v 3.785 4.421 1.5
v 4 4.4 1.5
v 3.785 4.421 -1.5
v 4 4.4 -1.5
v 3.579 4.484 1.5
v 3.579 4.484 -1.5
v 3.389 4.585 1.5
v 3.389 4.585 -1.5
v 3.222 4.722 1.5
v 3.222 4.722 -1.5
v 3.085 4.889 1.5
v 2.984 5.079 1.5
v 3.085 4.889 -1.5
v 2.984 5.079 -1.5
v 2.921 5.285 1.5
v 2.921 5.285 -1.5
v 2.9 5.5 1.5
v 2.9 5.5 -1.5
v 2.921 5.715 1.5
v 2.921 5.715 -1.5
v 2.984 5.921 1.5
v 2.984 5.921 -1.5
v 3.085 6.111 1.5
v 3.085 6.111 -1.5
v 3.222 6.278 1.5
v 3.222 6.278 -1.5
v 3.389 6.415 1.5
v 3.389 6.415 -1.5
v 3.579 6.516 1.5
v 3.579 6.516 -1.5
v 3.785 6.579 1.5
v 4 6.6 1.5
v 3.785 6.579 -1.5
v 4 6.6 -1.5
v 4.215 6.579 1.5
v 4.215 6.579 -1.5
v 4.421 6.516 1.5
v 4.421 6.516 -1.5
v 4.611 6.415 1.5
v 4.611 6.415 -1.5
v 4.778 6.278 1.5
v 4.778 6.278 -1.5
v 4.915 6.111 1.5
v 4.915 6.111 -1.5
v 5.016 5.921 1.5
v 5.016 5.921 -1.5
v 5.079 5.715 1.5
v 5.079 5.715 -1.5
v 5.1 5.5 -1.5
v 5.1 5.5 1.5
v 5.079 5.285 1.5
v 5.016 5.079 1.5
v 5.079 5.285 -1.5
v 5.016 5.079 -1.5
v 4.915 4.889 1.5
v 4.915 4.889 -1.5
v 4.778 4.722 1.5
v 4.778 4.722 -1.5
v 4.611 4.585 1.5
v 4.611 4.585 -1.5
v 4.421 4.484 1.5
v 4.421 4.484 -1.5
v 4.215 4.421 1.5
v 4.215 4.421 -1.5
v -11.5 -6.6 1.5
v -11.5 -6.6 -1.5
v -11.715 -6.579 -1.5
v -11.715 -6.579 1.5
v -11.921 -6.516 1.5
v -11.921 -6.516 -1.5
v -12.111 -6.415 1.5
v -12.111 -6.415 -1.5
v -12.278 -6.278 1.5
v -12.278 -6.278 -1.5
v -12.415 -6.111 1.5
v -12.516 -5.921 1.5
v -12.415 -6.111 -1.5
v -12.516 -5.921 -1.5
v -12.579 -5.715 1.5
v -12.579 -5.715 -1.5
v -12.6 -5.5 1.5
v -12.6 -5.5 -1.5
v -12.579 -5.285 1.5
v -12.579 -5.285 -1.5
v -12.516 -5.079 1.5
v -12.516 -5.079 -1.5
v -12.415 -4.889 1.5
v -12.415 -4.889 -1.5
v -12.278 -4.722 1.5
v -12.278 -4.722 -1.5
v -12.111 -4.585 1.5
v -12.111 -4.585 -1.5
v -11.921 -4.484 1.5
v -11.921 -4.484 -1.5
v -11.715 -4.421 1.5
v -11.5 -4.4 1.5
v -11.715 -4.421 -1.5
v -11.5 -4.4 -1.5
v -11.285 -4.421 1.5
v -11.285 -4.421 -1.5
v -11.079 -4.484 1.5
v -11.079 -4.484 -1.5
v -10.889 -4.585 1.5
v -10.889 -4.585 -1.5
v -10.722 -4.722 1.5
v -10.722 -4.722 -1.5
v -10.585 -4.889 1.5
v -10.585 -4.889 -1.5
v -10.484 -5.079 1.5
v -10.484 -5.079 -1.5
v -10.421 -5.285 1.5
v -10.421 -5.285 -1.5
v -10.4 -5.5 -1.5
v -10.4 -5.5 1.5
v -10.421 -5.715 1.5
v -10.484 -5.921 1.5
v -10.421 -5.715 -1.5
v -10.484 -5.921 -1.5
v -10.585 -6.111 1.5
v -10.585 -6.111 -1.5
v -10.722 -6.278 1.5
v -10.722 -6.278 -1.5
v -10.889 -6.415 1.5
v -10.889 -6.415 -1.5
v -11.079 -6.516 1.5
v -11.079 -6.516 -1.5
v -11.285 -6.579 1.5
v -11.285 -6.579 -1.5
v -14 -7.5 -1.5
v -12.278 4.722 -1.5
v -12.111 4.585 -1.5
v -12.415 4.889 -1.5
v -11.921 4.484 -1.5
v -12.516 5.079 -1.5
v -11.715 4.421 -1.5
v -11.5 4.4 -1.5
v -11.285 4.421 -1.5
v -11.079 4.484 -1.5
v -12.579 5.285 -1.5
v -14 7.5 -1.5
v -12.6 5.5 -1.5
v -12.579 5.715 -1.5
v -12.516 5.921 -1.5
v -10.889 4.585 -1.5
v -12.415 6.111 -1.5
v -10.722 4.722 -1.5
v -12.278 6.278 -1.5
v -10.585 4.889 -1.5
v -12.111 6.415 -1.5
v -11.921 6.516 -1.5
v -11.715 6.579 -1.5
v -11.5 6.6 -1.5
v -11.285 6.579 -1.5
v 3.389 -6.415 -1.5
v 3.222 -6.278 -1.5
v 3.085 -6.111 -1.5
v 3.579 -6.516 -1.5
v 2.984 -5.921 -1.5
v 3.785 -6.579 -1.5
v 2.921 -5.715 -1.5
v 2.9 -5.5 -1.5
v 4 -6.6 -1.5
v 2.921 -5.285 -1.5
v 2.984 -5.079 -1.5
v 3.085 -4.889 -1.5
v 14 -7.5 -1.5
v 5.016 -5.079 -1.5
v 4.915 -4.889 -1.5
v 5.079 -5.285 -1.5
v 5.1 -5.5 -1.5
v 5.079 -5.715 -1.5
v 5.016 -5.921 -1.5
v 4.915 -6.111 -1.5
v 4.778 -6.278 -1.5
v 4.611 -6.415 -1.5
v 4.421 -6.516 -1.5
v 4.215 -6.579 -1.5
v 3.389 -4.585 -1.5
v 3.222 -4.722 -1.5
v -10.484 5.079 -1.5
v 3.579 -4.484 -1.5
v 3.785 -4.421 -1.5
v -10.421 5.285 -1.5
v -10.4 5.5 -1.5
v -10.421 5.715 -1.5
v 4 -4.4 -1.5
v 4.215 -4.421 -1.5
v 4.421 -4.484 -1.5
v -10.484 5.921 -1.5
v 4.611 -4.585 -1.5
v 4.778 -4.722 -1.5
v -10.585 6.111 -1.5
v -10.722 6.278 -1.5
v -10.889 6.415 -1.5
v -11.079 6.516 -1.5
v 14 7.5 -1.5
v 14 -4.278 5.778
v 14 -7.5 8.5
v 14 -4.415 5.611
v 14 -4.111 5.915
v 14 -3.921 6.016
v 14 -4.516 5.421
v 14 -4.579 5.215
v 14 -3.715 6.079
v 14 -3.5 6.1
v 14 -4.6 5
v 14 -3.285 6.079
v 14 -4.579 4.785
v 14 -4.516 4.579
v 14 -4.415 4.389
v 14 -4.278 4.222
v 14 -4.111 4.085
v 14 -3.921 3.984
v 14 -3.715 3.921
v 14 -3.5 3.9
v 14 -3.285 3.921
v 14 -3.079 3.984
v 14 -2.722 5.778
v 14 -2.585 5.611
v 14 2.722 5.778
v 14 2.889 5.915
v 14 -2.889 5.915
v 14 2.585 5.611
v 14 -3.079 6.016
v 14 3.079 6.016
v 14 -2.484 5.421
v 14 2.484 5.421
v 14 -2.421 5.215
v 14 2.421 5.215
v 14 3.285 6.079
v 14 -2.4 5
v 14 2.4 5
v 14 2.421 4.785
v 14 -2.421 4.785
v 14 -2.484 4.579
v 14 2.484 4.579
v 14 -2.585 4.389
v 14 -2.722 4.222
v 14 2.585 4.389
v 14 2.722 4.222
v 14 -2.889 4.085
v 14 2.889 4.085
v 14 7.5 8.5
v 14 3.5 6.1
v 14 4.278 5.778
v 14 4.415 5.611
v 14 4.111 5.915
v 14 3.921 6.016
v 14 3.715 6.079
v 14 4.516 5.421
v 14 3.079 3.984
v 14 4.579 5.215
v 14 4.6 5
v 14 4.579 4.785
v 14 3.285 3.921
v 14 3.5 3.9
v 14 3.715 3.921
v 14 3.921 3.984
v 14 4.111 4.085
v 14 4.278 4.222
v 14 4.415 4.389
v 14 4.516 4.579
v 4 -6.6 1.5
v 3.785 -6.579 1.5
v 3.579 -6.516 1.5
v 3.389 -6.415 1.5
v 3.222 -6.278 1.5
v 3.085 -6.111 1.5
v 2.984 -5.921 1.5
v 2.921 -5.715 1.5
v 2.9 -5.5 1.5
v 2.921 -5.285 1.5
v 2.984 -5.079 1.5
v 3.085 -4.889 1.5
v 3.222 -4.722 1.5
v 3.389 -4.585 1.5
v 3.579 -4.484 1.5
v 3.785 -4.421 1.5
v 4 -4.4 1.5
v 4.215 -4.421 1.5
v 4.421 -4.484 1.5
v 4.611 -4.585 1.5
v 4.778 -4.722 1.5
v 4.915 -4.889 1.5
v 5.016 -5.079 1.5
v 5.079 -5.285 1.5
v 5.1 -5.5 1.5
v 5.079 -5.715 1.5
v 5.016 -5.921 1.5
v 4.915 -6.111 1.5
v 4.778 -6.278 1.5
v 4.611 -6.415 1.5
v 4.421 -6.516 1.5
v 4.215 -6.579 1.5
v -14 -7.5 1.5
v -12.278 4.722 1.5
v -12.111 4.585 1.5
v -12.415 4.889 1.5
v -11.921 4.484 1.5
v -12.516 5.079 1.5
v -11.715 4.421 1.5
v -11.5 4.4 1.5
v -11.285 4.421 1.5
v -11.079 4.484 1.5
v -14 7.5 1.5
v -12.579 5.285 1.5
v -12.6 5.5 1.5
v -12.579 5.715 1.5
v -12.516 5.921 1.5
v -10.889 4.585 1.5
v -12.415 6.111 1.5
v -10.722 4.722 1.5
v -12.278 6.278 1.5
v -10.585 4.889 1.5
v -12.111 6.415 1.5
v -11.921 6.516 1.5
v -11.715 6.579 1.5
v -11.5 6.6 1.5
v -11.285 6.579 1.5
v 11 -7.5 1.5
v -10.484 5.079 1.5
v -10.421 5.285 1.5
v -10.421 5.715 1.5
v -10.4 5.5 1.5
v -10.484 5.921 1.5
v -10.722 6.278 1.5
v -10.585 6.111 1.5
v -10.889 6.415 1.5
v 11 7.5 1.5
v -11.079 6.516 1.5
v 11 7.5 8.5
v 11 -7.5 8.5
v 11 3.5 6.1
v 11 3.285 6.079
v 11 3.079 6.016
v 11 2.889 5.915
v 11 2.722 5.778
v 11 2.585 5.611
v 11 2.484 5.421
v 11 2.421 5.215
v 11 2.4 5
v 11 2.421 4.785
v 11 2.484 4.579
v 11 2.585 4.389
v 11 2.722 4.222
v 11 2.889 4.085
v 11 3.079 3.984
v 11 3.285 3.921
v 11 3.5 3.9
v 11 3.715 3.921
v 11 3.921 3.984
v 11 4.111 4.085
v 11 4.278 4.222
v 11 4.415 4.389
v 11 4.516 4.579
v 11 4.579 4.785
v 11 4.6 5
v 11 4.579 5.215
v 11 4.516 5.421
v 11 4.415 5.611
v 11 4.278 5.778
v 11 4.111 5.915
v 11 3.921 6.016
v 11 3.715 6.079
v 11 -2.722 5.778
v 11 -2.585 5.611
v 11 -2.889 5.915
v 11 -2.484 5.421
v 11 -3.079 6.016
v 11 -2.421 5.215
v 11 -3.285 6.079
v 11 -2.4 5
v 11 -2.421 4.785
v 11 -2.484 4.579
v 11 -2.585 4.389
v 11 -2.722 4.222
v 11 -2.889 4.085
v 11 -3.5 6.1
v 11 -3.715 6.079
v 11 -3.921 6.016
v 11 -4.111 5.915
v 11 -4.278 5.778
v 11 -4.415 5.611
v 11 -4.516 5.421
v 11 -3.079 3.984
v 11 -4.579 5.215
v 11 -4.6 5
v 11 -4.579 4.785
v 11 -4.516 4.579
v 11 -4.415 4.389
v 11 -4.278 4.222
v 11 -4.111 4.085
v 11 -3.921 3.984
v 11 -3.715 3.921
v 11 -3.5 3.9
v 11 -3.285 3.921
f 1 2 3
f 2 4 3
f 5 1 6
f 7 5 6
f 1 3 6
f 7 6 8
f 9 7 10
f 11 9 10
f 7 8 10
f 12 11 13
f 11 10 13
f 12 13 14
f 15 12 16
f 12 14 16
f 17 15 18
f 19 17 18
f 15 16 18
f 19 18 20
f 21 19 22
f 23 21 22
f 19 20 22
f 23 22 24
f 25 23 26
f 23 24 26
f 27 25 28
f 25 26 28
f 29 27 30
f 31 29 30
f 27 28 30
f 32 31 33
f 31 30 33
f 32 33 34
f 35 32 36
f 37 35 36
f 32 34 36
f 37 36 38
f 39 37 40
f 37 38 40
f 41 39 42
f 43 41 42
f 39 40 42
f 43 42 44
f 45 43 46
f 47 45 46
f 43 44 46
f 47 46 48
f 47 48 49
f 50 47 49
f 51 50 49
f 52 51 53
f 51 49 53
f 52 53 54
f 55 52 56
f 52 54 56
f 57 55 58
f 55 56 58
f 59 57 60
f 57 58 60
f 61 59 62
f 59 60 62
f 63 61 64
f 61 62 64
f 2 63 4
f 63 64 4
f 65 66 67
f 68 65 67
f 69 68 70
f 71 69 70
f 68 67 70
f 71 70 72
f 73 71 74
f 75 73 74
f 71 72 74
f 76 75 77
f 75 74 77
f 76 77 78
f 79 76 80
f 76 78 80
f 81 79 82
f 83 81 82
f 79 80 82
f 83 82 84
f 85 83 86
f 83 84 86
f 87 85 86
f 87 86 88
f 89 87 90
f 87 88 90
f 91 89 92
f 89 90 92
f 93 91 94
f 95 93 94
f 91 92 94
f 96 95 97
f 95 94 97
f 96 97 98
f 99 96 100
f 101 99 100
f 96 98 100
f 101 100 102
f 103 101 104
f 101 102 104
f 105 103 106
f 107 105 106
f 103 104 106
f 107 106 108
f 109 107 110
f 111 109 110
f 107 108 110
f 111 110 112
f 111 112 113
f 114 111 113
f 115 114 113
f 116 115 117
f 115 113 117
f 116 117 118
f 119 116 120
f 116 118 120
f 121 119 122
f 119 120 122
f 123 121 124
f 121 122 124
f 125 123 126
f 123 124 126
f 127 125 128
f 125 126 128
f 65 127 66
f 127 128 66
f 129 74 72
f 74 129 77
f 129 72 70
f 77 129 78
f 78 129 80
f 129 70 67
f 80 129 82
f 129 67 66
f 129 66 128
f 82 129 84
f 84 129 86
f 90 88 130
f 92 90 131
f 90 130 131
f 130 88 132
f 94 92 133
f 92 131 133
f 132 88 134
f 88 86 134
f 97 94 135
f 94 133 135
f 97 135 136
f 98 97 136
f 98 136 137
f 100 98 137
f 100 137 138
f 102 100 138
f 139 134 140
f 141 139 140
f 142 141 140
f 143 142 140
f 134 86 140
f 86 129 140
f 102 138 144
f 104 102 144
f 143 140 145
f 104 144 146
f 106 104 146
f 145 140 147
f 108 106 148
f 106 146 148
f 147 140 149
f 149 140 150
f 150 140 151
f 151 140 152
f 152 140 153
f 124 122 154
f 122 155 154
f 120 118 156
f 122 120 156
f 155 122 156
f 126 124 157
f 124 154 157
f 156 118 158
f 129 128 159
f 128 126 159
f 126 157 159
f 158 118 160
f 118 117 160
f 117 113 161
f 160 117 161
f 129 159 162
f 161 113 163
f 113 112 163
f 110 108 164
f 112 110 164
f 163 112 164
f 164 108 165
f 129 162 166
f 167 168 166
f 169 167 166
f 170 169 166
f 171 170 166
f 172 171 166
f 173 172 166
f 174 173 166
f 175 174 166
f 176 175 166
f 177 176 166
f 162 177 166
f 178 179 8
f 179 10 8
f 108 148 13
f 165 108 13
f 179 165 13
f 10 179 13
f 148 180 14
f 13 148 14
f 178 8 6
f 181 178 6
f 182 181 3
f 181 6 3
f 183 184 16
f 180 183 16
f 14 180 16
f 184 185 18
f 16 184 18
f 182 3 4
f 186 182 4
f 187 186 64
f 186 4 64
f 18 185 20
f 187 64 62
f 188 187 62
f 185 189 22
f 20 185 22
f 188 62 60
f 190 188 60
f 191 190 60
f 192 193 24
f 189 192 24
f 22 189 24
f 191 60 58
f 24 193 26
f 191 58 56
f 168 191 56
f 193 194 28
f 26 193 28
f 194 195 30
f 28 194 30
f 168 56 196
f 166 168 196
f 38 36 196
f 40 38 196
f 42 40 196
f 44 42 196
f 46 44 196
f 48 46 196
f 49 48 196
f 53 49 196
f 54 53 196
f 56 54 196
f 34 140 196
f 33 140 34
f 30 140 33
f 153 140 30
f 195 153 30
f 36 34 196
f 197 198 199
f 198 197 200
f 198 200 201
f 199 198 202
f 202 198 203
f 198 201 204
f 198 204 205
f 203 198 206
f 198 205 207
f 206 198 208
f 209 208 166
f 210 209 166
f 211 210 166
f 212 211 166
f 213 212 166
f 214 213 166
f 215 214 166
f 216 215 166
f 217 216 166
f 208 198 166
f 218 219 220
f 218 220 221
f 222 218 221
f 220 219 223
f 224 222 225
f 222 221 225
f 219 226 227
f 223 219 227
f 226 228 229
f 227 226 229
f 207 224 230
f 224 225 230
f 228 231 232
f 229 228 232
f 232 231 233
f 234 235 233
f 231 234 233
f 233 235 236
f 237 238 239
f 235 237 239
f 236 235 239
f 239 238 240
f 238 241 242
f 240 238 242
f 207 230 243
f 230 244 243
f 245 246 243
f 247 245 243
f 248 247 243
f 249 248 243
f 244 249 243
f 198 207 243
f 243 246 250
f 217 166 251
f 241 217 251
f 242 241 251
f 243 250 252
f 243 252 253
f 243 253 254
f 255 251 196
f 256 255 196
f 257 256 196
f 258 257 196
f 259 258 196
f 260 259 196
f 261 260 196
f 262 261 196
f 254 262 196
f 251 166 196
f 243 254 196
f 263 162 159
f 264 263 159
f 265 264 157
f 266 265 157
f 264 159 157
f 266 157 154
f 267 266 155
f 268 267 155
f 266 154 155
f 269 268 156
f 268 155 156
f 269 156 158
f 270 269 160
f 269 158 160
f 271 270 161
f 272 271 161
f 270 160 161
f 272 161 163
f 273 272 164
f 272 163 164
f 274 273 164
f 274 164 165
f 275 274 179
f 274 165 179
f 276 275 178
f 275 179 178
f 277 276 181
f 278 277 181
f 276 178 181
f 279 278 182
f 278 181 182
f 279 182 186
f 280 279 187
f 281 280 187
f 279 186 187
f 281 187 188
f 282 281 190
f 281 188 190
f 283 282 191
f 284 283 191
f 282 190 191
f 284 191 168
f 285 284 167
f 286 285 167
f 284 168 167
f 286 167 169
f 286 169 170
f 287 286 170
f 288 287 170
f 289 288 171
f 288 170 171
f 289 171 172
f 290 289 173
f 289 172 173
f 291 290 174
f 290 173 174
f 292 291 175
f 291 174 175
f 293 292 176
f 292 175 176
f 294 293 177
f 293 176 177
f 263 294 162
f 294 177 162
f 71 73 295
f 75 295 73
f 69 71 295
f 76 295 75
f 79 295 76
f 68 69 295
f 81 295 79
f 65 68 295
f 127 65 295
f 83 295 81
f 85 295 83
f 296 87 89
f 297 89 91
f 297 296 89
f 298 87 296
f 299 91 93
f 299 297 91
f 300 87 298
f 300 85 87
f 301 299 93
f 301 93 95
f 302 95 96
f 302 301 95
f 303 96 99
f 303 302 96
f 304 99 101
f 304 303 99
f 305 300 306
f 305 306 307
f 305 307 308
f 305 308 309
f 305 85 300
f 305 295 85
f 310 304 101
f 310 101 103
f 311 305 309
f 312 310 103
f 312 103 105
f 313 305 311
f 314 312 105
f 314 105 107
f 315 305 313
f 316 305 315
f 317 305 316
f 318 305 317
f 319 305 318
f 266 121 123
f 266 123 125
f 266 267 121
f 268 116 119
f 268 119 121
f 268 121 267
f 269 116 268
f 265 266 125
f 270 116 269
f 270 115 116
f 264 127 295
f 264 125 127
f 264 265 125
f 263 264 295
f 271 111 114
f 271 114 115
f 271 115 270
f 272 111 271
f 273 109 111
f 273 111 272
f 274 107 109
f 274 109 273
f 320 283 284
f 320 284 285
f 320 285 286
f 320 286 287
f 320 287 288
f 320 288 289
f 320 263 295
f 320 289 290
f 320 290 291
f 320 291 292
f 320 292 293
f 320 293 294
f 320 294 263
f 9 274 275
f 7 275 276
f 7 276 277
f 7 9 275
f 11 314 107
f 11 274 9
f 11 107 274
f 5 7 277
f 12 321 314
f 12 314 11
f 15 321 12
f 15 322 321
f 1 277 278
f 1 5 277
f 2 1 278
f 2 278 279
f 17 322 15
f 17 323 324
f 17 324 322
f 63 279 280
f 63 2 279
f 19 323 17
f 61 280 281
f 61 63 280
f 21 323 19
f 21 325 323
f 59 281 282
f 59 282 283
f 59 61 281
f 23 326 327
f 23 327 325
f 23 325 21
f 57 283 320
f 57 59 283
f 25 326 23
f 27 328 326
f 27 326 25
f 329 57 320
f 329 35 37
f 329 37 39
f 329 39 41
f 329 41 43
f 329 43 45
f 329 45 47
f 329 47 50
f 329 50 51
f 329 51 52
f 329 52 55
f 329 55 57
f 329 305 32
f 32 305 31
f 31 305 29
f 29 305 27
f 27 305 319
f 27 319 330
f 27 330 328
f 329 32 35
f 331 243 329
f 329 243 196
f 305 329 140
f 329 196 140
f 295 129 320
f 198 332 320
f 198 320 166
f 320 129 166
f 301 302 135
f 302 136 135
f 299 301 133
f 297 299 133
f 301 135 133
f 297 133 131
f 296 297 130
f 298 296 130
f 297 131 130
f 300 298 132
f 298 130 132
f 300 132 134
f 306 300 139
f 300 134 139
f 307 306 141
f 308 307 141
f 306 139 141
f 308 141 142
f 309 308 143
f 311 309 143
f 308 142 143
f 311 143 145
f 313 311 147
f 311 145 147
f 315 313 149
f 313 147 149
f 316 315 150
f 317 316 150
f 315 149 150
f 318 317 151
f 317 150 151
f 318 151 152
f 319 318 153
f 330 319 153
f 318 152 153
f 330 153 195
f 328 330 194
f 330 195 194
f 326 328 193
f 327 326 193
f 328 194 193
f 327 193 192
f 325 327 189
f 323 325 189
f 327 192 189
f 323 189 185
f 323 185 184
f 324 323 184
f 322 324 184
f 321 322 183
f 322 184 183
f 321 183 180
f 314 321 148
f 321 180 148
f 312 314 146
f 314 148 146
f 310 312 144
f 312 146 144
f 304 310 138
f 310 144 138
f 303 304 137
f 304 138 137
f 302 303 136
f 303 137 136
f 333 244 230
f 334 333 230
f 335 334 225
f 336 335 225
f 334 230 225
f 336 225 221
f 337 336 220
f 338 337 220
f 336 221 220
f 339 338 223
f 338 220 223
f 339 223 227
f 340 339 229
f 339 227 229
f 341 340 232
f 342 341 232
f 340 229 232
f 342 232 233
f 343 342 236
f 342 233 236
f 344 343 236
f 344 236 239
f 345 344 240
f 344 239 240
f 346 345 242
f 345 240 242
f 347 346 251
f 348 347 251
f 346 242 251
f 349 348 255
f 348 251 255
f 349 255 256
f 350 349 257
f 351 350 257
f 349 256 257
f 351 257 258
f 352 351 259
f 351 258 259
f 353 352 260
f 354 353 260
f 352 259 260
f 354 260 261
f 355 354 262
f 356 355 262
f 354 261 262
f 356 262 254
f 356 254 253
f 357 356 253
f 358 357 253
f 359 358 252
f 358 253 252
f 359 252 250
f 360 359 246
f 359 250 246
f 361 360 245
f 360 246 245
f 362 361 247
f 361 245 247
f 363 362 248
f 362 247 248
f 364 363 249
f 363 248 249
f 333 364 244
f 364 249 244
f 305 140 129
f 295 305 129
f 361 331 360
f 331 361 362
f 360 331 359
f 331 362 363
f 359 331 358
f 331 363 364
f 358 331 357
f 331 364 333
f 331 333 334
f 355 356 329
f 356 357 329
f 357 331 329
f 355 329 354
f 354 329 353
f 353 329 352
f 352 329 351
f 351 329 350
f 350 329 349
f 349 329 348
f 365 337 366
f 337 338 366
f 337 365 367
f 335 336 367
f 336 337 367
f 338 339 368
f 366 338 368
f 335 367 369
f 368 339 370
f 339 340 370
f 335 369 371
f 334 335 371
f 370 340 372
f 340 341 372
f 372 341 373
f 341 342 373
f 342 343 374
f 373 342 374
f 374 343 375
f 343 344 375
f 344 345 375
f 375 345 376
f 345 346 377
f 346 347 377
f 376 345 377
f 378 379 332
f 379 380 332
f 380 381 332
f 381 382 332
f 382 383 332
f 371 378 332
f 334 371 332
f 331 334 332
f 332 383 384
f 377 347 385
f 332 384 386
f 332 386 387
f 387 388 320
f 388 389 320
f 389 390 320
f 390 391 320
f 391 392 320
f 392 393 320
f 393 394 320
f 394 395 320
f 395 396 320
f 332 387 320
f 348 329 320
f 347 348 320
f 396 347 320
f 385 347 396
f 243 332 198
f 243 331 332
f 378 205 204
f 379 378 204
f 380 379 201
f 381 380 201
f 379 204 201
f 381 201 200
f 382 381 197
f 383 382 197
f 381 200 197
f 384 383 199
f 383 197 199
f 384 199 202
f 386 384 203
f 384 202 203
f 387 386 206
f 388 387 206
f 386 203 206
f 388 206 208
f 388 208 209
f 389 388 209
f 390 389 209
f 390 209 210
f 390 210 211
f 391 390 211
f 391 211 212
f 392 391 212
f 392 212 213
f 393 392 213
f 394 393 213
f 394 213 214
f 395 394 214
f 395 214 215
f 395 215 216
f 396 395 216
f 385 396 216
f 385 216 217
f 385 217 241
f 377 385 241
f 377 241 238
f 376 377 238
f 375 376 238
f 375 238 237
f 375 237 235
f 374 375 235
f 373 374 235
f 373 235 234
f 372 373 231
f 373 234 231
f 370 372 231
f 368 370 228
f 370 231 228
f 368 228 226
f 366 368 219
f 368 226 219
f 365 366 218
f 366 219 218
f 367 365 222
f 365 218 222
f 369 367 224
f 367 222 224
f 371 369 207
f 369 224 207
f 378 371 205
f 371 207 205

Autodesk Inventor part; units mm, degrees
ref_plane "YZ Plane" through (0, 0, 0) normal (1, 0, 0) x (0, 1, 0)
ref_plane "XZ Plane" through (0, 0, 0) normal (0, 1, 0) x (-1, 0, 0)
ref_plane "XY Plane" through (0, 0, 0) normal (0, 0, 1) x (1, 0, 0)
sketch "スケッチ1" plane through (0, 0, 0) normal (0, 0, 1) x (1, 0, 0)
  line L0 (-14, -7.5) -> (14, -7.5)
  line L1 (14, -7.5) -> (14, 7.5)
  line L2 (14, 7.5) -> (-14, 7.5)
  line L3 (-14, 7.5) -> (-14, -7.5)
  line L4 (-14, -7.5) -> (14, 7.5) construction
  line L5 (14, -7.5) -> (-14, 7.5) construction
  point P0 (0, 0)
  dimension "d0" = 28
  dimension "d1" = 15
extrude "押し出し1" add sketch "スケッチ1" along normal mid plane 3
sketch "スケッチ2" plane through (0, 0, 1.5) normal (0, 0, 1) x (1, 0, 0)
  line L0 (14, -7.5) -> (14, 7.5) projected
  line L1 (-14, -7.5) -> (14, -7.5) projected
  line L2 (14, 7.5) -> (11, 7.5)
  line L3 (11, 7.5) -> (11, -7.5)
  line L4 (11, -7.5) -> (14, -7.5)
  line L5 (14, -7.5) -> (14, 7.5)
  point P0 (0, 0)
  dimension "d4" = 3
extrude "押し出し2" add sketch "スケッチ2" along normal blind 7
sketch "スケッチ3" plane through (0, 0, 1.5) normal (0, 0, 1) x (1, 0, 0)
  line L0 (-14, 7.5) -> (-14, -7.5) projected
  line L1 (0, 0) -> (-2.791, 0)
  point P0 (-11.5, 5.5)
  point P1 (4, 5.5)
  point P2 (-11.5, -5.5)
  point P3 (4, -5.5)
  dimension "d7" = 15.5
  dimension "d8" = 2.5
  dimension "d9" = 5.5
  dimension "d10" = 5.5
hole "穴1" at (-11.5, 5.5, 1.5) at (4, 5.5, 1.5) at (-11.5, -5.5, 1.5) at (4, -5.5, 1.5) direction (0, 0, -1) diameter 2.2 end through all
sketch "スケッチ4" plane through (11, -7.5, 1.5) normal (-1, 0, 0) x (0, 0, 1)
  line L0 (0, 15) -> (7, 15) projected
  line L1 (7, 15) -> (7, 0) projected
  line L2 (0, 0) -> (7, 0) projected
  point P0 (-1.5, 7.5)
  point P1 (3.5, 11)
  point P2 (3.5, 4)
  dimension "d18" = 4
  dimension "d19" = 3.5
  dimension "d20" = 3.5
  dimension "d21" = 4
hole "穴2" at (11, 3.5, 5) at (11, -3.5, 5) direction (1, 0, 0) diameter 2.2 end through all
equation "\"d10\" = d9"
equation "\"d20\" = d19"
equation "\"d21\" = d18"
properties part number "sponge_holder"
